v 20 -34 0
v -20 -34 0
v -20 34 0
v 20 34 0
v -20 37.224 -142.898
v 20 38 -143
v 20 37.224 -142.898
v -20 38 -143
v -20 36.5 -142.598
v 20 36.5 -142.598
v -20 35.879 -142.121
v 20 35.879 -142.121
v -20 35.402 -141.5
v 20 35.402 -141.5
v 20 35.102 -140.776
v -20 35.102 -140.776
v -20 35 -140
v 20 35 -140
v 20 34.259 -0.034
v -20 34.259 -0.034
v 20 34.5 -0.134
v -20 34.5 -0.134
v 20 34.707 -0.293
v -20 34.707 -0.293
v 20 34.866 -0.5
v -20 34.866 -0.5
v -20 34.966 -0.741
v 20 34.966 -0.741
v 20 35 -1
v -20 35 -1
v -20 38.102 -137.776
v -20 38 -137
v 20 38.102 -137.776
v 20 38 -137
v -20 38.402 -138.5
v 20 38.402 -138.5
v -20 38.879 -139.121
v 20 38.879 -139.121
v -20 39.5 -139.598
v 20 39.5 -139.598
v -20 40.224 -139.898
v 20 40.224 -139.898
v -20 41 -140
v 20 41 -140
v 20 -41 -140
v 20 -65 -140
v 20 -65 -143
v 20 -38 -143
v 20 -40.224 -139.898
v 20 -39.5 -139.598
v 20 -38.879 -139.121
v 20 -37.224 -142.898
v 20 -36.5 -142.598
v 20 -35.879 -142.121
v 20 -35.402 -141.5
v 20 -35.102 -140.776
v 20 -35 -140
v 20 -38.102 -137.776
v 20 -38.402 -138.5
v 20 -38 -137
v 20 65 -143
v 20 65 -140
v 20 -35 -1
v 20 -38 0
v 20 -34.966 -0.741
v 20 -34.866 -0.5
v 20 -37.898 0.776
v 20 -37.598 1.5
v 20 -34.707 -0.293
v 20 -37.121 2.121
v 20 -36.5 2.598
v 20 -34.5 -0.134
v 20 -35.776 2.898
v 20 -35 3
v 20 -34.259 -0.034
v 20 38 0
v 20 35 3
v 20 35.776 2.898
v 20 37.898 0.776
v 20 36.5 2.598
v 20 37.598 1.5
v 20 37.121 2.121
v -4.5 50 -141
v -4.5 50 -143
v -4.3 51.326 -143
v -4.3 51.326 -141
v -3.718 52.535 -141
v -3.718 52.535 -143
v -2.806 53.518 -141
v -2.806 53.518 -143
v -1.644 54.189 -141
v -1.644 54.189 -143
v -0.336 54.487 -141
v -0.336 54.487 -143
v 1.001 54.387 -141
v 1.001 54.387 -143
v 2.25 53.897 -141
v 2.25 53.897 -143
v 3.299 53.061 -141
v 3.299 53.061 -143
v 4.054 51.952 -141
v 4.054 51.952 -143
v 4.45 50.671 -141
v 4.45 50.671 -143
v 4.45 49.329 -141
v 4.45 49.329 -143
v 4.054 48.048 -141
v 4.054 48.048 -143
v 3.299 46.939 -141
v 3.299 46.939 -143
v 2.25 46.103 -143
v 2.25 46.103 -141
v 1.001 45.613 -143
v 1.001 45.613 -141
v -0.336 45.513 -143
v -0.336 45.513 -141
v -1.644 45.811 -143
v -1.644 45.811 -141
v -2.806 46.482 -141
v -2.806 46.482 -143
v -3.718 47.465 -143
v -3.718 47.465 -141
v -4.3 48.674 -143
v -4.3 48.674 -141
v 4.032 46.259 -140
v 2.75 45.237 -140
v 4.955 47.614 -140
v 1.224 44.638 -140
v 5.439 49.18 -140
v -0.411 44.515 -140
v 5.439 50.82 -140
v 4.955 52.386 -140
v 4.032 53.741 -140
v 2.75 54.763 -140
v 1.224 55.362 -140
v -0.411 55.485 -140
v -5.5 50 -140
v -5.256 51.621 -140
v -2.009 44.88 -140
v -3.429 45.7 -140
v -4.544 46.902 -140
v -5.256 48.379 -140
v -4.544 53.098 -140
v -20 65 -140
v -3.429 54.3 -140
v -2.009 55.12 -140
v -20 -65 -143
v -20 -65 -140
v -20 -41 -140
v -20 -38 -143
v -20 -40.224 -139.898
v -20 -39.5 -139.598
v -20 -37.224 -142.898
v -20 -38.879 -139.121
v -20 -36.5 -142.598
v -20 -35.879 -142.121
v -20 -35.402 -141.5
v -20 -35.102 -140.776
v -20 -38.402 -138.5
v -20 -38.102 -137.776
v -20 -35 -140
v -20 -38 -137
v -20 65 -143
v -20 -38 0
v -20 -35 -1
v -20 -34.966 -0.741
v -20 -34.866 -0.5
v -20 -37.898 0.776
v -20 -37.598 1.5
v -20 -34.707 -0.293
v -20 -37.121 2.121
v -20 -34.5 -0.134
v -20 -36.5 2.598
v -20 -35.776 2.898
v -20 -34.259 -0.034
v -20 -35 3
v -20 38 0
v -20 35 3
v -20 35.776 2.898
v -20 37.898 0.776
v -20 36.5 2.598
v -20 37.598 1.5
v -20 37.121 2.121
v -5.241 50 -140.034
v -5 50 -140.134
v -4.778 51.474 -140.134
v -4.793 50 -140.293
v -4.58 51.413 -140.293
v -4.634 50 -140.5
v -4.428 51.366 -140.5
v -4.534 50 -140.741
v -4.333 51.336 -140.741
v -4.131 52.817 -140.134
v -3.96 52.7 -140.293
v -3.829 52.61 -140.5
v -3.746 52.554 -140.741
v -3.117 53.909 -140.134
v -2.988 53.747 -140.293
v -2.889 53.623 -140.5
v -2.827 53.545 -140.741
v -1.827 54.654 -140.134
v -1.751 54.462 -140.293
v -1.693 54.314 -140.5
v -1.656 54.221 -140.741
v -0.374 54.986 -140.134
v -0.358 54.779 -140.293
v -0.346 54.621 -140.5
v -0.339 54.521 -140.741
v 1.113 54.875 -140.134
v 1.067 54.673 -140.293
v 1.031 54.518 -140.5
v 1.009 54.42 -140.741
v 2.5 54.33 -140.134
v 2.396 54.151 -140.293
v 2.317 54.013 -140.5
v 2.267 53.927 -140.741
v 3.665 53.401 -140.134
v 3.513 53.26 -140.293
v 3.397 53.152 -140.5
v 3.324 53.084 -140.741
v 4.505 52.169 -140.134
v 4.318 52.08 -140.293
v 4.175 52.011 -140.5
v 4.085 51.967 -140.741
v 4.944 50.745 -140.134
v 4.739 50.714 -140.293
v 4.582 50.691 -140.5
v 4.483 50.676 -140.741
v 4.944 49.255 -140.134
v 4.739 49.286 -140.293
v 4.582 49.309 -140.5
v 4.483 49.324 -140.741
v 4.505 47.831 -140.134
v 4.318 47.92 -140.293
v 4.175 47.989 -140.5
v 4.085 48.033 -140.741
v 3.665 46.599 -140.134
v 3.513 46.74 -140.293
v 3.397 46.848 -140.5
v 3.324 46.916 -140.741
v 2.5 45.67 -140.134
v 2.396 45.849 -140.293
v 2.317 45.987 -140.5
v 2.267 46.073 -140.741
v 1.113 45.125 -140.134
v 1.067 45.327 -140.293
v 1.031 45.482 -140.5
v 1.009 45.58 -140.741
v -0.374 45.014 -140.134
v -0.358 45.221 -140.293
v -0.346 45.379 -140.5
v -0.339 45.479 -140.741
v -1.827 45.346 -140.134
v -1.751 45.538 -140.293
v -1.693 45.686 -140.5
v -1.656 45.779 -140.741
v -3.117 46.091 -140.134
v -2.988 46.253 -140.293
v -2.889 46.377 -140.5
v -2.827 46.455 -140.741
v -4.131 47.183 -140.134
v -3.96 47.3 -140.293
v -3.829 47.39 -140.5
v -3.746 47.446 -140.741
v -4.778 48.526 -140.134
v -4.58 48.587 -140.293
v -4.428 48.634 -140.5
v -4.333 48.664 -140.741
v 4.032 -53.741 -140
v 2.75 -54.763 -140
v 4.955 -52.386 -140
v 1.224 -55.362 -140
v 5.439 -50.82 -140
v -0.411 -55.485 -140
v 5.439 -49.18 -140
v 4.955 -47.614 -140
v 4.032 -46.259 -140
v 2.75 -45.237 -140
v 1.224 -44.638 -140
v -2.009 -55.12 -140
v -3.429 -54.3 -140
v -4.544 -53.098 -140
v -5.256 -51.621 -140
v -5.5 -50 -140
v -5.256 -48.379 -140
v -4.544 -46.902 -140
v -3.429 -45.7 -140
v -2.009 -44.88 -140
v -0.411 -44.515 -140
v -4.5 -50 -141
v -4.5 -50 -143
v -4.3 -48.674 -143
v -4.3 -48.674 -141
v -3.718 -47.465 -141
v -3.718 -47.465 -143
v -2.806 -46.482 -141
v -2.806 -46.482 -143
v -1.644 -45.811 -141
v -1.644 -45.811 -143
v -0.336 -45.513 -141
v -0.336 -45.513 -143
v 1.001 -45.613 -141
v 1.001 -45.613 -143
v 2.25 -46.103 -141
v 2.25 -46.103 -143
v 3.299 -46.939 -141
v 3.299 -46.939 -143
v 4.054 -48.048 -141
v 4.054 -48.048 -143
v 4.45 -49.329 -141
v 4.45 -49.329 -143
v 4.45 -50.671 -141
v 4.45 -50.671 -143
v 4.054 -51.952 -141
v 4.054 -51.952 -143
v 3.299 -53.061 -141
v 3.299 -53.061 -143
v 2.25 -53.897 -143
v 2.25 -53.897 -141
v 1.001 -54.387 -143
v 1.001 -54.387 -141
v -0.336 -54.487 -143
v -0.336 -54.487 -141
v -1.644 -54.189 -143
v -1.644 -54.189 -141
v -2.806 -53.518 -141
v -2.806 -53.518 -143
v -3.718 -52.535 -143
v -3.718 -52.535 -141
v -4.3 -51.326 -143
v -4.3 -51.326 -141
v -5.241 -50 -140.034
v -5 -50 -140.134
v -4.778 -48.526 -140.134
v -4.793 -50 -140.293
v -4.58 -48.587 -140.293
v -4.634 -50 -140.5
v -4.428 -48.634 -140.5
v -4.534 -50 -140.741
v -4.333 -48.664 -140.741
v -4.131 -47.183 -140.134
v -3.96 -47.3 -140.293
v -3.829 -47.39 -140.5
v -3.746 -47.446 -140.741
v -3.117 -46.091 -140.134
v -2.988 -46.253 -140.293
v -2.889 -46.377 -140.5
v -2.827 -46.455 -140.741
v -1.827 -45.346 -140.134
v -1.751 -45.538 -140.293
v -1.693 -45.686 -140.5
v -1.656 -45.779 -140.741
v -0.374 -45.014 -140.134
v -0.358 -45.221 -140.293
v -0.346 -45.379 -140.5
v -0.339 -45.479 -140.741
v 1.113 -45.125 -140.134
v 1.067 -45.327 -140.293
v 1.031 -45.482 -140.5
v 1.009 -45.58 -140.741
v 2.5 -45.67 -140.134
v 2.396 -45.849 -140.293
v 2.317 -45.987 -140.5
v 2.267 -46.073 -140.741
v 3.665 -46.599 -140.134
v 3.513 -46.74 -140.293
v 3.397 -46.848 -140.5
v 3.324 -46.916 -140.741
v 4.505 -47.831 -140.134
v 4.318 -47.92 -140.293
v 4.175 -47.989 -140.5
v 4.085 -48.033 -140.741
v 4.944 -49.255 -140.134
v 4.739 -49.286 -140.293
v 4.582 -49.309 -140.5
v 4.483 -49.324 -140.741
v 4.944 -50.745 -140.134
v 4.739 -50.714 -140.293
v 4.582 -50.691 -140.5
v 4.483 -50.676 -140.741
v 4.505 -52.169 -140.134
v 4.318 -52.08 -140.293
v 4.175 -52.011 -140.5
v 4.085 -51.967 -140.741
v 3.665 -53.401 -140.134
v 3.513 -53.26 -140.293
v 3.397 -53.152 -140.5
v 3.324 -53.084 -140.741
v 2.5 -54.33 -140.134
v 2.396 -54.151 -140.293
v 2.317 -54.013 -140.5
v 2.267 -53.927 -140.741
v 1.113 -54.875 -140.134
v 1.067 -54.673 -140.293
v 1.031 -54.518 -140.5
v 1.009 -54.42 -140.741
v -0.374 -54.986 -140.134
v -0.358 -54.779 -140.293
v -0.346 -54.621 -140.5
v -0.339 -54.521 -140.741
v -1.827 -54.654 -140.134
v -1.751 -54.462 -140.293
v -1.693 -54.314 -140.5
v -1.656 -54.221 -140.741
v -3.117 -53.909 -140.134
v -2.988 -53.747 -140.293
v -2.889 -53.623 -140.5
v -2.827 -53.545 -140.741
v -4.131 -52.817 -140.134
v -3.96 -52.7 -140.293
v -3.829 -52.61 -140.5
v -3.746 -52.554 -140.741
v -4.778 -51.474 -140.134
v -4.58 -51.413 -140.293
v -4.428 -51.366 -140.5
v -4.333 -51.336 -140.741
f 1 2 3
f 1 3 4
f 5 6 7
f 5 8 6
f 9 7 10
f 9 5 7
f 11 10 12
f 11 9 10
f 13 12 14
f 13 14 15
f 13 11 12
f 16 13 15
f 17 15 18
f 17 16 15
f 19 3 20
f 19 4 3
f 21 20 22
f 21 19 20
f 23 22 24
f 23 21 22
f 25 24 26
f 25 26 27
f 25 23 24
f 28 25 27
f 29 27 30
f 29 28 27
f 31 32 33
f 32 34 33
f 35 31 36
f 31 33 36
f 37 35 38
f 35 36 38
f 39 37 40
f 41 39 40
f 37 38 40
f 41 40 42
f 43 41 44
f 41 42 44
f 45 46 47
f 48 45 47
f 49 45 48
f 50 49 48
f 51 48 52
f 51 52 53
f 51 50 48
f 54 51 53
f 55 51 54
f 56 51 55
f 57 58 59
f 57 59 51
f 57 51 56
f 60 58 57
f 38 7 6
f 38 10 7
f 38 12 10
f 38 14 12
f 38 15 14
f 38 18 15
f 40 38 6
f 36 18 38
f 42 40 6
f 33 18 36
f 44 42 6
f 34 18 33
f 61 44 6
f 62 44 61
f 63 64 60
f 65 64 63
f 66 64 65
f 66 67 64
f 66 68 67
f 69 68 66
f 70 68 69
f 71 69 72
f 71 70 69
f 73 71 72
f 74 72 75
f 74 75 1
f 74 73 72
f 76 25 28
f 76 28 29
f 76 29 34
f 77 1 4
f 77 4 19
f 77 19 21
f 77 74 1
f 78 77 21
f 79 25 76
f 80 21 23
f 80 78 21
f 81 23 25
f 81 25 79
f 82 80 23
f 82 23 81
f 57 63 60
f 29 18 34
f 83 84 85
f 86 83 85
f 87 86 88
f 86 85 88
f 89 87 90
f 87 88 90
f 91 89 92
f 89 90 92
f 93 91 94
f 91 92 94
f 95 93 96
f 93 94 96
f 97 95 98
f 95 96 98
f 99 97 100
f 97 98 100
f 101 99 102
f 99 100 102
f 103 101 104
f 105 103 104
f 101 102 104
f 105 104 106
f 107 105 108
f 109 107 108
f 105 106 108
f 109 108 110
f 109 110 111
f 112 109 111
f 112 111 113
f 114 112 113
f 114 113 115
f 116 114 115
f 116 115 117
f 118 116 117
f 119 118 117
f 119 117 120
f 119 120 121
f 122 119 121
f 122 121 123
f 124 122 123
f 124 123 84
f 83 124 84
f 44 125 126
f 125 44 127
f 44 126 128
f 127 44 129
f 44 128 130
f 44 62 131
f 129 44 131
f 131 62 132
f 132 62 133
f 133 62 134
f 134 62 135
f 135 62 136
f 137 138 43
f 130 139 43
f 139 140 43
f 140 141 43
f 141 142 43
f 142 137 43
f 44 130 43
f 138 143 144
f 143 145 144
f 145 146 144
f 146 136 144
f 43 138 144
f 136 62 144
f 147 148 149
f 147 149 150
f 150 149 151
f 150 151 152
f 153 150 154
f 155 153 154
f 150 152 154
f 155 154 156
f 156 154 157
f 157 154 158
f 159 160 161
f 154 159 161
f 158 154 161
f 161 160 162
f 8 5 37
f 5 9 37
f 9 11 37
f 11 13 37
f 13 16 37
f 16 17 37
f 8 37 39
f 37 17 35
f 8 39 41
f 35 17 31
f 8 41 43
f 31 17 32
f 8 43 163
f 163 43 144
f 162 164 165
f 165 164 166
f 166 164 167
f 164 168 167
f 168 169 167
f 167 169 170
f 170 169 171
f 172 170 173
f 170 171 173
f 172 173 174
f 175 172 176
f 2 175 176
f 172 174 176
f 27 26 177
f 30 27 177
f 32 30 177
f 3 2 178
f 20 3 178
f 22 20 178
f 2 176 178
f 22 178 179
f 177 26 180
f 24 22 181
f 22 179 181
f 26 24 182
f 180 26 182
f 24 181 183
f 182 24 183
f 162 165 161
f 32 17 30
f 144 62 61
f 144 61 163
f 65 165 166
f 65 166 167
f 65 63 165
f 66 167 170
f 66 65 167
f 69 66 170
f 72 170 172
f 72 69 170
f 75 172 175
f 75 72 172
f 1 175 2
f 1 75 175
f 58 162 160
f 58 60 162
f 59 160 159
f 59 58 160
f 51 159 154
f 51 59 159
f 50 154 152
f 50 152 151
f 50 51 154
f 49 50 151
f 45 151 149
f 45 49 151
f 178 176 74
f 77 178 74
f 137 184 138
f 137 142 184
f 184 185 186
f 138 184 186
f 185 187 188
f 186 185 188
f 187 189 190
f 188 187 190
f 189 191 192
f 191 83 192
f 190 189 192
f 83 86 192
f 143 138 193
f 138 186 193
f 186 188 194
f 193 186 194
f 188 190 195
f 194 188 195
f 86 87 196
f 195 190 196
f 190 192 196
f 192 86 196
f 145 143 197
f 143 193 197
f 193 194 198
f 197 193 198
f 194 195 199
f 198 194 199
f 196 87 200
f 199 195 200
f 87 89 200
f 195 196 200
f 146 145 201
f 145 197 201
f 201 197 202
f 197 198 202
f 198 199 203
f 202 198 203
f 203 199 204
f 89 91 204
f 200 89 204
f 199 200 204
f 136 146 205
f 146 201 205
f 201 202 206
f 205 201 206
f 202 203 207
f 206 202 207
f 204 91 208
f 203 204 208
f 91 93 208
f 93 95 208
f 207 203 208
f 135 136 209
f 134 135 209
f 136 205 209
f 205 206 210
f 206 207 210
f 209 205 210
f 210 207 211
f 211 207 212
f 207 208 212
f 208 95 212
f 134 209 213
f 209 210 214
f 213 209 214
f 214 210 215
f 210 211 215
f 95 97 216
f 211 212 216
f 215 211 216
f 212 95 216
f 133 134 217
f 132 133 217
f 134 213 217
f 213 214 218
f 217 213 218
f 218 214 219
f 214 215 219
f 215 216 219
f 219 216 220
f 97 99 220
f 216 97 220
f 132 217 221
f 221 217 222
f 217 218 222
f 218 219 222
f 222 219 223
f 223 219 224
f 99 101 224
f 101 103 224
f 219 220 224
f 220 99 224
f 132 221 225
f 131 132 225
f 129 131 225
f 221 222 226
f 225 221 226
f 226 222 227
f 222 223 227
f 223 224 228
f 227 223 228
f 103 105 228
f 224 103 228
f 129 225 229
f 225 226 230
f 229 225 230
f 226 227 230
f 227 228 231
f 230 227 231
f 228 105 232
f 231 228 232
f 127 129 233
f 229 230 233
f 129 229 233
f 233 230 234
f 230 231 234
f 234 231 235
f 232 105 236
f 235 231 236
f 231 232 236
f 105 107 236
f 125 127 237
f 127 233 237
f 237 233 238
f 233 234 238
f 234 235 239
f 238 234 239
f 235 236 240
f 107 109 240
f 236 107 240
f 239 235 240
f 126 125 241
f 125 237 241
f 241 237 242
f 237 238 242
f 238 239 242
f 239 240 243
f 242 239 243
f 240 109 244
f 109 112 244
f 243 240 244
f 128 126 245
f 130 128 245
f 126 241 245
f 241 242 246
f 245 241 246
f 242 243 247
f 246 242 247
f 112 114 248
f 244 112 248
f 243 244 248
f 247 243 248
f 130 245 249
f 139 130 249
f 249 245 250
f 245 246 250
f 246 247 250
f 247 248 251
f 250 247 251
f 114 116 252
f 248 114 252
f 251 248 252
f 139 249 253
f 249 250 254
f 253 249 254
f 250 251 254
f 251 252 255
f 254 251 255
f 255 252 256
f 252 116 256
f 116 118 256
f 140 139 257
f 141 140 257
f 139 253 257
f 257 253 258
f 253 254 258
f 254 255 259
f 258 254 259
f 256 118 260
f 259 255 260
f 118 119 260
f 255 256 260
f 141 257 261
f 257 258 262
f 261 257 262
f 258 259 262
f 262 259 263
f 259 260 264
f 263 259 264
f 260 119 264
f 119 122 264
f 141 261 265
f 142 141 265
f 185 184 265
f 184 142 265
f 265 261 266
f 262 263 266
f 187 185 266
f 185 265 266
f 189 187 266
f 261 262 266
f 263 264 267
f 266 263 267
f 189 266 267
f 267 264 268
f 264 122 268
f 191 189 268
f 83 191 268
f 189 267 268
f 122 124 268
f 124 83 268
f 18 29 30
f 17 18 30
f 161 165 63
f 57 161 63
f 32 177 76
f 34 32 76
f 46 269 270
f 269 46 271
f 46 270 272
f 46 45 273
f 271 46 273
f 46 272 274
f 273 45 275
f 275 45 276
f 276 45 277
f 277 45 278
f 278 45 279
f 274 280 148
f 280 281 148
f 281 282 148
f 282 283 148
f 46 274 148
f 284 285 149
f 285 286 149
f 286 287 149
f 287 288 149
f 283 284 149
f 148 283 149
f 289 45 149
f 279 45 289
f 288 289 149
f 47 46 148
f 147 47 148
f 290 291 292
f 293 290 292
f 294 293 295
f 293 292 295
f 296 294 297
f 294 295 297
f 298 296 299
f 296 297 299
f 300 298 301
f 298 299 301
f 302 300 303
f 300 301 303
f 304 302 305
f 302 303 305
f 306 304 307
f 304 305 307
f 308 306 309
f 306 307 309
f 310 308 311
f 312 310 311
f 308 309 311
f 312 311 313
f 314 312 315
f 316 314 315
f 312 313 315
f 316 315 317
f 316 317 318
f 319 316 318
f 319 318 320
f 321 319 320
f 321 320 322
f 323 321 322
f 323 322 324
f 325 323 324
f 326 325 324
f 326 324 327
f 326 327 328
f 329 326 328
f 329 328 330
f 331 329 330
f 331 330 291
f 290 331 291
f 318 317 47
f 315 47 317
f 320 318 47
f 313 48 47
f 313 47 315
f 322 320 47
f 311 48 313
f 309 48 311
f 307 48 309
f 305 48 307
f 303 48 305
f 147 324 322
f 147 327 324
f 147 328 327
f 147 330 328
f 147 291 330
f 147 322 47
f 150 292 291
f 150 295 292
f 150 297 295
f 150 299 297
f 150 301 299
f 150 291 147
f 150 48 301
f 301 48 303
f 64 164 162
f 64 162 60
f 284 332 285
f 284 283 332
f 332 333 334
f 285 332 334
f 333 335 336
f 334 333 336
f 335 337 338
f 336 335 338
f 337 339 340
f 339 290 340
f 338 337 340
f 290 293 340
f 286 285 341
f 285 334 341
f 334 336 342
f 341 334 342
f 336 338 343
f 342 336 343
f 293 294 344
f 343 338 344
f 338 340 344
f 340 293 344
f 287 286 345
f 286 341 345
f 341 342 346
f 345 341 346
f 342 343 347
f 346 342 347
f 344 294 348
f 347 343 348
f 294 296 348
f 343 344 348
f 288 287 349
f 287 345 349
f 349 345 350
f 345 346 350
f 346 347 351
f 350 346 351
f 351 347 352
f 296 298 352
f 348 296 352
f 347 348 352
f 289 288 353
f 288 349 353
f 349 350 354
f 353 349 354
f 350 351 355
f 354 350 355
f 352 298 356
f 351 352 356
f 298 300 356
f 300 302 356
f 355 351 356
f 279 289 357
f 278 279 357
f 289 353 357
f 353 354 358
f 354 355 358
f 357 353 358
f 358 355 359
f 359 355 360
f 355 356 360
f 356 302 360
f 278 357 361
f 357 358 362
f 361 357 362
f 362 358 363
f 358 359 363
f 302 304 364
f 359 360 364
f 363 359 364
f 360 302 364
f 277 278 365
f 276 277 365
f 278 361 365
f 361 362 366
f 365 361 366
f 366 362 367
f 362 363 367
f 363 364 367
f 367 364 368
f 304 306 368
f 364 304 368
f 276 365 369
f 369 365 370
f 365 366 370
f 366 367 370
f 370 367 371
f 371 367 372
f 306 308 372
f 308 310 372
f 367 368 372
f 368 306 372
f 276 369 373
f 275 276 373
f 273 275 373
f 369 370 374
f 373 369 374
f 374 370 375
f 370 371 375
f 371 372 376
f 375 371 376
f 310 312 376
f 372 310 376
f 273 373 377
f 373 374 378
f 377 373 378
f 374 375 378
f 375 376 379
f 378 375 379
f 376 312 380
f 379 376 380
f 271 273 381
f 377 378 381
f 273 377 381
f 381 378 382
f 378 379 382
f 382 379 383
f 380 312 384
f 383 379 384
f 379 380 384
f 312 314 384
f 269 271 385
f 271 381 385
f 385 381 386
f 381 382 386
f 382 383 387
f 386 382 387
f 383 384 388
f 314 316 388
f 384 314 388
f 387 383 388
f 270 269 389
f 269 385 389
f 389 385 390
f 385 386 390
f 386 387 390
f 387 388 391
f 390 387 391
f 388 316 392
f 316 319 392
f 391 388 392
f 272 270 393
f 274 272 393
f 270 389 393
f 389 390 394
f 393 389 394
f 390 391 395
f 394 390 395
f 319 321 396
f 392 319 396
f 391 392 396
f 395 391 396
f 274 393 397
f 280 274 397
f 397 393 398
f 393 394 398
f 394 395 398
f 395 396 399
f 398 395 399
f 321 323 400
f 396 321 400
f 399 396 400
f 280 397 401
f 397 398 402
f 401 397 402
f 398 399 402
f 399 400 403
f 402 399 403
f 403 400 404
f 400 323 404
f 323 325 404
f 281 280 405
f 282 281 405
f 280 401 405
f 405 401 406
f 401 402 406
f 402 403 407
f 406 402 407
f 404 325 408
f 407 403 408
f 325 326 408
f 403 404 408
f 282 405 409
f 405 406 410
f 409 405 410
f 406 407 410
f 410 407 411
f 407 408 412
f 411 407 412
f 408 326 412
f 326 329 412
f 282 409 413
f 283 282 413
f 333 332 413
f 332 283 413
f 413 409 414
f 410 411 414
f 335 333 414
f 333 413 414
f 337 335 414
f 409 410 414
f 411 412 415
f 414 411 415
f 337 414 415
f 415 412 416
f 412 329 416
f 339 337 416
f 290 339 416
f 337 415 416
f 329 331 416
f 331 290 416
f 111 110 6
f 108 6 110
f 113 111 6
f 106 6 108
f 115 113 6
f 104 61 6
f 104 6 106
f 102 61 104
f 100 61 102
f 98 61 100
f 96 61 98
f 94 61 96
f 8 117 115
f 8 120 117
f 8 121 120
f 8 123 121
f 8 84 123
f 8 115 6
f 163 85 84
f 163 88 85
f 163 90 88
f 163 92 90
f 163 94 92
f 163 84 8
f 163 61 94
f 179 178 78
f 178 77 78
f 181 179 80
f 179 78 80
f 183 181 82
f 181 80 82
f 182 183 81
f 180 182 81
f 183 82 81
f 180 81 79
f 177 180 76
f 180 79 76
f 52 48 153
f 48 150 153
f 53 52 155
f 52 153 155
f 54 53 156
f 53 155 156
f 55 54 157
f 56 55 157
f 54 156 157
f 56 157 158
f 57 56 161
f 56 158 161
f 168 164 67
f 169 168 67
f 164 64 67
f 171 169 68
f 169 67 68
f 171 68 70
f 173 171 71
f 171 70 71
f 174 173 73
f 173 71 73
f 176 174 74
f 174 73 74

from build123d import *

# Parameters (mm, degrees)
ESQUISSE1_W             = 40
ESQUISSE1_H             = 70
BOSS_EXTRU_1_DEPTH      = 3
ESQUISSE4_W             = 40
ESQUISSE4_H             = 3
BOSS_EXTRU_3_DEPTH      = 143
ESQUISSE5_W             = 40
ESQUISSE5_H             = 30
BOSS_EXTRU_4_DEPTH      = 3
ESQUISSE6_R             = 4.5
ENL_V_MAT_EXTRU_1_DEPTH = 147
CONG_1_R                = 1
CONG_2_R                = 3
CONG_3_R                = 3
CONG_4_R                = 3
CONG_5_R                = 1


with BuildPart() as part:
    # Esquisse1 → Boss.-Extru.1 (new body)
    with BuildSketch(Plane.XY):
        Rectangle(ESQUISSE1_W, ESQUISSE1_H)
    extrude(amount=BOSS_EXTRU_1_DEPTH)

    # Esquisse4 → Boss.-Extru.3 (add)
    with BuildSketch(Plane.XY.offset(3)):
        with Locations((0, 36.5)):
            Rectangle(ESQUISSE4_W, ESQUISSE4_H)
        with Locations((0, -36.5)):
            Rectangle(ESQUISSE4_W, ESQUISSE4_H)
    extrude(amount=-BOSS_EXTRU_3_DEPTH)

    # Esquisse5 → Boss.-Extru.4 (add)
    with BuildSketch(Plane(origin=(0, 0, -140), x_dir=(-1, 0, 0), z_dir=(0, 0, -1))):
        with Locations((0, 50)):
            Rectangle(ESQUISSE5_W, ESQUISSE5_H)
        with Locations((0, -50)):
            Rectangle(ESQUISSE5_W, ESQUISSE5_H)
    extrude(amount=BOSS_EXTRU_4_DEPTH)

    # Esquisse6 → Enlèv. mat.-Extru.1 (cut, through all)
    with BuildSketch(Plane(origin=(0, 0, -143), x_dir=(-1, 0, 0), z_dir=(0, 0, -1))):
        with Locations((0, 50)):
            Circle(ESQUISSE6_R)
        with Locations((0, -50)):
            Circle(ESQUISSE6_R)
    extrude(amount=-ENL_V_MAT_EXTRU_1_DEPTH, mode=Mode.SUBTRACT)

    # Congé1
    cong_1_edges = [part.edges().sort_by_distance(p)[0] for p in [
        (0, 35, 0),
        (0, -35, 0),
    ]]
    fillet(cong_1_edges, radius=CONG_1_R)

    # Congé2
    cong_2_edges = [part.edges().sort_by_distance(p)[0] for p in [
        (0, 38, 3),
        (0, -38, 3),
    ]]
    fillet(cong_2_edges, radius=CONG_2_R)

    # Congé3
    cong_3_edges = [part.edges().sort_by_distance(p)[0] for p in [
        (0, 38, -140),
        (0, -38, -140),
    ]]
    fillet(cong_3_edges, radius=CONG_3_R)

    # Congé4
    cong_4_edges = [part.edges().sort_by_distance(p)[0] for p in [
        (0, 35, -143),
        (0, -35, -143),
    ]]
    fillet(cong_4_edges, radius=CONG_4_R)

    # Congé5
    cong_5_edges = [part.edges().sort_by_distance(p)[0] for p in [
        (4.5, 50, -140),
        (4.5, -50, -140),
    ]]
    fillet(cong_5_edges, radius=CONG_5_R)


solid = part.part
